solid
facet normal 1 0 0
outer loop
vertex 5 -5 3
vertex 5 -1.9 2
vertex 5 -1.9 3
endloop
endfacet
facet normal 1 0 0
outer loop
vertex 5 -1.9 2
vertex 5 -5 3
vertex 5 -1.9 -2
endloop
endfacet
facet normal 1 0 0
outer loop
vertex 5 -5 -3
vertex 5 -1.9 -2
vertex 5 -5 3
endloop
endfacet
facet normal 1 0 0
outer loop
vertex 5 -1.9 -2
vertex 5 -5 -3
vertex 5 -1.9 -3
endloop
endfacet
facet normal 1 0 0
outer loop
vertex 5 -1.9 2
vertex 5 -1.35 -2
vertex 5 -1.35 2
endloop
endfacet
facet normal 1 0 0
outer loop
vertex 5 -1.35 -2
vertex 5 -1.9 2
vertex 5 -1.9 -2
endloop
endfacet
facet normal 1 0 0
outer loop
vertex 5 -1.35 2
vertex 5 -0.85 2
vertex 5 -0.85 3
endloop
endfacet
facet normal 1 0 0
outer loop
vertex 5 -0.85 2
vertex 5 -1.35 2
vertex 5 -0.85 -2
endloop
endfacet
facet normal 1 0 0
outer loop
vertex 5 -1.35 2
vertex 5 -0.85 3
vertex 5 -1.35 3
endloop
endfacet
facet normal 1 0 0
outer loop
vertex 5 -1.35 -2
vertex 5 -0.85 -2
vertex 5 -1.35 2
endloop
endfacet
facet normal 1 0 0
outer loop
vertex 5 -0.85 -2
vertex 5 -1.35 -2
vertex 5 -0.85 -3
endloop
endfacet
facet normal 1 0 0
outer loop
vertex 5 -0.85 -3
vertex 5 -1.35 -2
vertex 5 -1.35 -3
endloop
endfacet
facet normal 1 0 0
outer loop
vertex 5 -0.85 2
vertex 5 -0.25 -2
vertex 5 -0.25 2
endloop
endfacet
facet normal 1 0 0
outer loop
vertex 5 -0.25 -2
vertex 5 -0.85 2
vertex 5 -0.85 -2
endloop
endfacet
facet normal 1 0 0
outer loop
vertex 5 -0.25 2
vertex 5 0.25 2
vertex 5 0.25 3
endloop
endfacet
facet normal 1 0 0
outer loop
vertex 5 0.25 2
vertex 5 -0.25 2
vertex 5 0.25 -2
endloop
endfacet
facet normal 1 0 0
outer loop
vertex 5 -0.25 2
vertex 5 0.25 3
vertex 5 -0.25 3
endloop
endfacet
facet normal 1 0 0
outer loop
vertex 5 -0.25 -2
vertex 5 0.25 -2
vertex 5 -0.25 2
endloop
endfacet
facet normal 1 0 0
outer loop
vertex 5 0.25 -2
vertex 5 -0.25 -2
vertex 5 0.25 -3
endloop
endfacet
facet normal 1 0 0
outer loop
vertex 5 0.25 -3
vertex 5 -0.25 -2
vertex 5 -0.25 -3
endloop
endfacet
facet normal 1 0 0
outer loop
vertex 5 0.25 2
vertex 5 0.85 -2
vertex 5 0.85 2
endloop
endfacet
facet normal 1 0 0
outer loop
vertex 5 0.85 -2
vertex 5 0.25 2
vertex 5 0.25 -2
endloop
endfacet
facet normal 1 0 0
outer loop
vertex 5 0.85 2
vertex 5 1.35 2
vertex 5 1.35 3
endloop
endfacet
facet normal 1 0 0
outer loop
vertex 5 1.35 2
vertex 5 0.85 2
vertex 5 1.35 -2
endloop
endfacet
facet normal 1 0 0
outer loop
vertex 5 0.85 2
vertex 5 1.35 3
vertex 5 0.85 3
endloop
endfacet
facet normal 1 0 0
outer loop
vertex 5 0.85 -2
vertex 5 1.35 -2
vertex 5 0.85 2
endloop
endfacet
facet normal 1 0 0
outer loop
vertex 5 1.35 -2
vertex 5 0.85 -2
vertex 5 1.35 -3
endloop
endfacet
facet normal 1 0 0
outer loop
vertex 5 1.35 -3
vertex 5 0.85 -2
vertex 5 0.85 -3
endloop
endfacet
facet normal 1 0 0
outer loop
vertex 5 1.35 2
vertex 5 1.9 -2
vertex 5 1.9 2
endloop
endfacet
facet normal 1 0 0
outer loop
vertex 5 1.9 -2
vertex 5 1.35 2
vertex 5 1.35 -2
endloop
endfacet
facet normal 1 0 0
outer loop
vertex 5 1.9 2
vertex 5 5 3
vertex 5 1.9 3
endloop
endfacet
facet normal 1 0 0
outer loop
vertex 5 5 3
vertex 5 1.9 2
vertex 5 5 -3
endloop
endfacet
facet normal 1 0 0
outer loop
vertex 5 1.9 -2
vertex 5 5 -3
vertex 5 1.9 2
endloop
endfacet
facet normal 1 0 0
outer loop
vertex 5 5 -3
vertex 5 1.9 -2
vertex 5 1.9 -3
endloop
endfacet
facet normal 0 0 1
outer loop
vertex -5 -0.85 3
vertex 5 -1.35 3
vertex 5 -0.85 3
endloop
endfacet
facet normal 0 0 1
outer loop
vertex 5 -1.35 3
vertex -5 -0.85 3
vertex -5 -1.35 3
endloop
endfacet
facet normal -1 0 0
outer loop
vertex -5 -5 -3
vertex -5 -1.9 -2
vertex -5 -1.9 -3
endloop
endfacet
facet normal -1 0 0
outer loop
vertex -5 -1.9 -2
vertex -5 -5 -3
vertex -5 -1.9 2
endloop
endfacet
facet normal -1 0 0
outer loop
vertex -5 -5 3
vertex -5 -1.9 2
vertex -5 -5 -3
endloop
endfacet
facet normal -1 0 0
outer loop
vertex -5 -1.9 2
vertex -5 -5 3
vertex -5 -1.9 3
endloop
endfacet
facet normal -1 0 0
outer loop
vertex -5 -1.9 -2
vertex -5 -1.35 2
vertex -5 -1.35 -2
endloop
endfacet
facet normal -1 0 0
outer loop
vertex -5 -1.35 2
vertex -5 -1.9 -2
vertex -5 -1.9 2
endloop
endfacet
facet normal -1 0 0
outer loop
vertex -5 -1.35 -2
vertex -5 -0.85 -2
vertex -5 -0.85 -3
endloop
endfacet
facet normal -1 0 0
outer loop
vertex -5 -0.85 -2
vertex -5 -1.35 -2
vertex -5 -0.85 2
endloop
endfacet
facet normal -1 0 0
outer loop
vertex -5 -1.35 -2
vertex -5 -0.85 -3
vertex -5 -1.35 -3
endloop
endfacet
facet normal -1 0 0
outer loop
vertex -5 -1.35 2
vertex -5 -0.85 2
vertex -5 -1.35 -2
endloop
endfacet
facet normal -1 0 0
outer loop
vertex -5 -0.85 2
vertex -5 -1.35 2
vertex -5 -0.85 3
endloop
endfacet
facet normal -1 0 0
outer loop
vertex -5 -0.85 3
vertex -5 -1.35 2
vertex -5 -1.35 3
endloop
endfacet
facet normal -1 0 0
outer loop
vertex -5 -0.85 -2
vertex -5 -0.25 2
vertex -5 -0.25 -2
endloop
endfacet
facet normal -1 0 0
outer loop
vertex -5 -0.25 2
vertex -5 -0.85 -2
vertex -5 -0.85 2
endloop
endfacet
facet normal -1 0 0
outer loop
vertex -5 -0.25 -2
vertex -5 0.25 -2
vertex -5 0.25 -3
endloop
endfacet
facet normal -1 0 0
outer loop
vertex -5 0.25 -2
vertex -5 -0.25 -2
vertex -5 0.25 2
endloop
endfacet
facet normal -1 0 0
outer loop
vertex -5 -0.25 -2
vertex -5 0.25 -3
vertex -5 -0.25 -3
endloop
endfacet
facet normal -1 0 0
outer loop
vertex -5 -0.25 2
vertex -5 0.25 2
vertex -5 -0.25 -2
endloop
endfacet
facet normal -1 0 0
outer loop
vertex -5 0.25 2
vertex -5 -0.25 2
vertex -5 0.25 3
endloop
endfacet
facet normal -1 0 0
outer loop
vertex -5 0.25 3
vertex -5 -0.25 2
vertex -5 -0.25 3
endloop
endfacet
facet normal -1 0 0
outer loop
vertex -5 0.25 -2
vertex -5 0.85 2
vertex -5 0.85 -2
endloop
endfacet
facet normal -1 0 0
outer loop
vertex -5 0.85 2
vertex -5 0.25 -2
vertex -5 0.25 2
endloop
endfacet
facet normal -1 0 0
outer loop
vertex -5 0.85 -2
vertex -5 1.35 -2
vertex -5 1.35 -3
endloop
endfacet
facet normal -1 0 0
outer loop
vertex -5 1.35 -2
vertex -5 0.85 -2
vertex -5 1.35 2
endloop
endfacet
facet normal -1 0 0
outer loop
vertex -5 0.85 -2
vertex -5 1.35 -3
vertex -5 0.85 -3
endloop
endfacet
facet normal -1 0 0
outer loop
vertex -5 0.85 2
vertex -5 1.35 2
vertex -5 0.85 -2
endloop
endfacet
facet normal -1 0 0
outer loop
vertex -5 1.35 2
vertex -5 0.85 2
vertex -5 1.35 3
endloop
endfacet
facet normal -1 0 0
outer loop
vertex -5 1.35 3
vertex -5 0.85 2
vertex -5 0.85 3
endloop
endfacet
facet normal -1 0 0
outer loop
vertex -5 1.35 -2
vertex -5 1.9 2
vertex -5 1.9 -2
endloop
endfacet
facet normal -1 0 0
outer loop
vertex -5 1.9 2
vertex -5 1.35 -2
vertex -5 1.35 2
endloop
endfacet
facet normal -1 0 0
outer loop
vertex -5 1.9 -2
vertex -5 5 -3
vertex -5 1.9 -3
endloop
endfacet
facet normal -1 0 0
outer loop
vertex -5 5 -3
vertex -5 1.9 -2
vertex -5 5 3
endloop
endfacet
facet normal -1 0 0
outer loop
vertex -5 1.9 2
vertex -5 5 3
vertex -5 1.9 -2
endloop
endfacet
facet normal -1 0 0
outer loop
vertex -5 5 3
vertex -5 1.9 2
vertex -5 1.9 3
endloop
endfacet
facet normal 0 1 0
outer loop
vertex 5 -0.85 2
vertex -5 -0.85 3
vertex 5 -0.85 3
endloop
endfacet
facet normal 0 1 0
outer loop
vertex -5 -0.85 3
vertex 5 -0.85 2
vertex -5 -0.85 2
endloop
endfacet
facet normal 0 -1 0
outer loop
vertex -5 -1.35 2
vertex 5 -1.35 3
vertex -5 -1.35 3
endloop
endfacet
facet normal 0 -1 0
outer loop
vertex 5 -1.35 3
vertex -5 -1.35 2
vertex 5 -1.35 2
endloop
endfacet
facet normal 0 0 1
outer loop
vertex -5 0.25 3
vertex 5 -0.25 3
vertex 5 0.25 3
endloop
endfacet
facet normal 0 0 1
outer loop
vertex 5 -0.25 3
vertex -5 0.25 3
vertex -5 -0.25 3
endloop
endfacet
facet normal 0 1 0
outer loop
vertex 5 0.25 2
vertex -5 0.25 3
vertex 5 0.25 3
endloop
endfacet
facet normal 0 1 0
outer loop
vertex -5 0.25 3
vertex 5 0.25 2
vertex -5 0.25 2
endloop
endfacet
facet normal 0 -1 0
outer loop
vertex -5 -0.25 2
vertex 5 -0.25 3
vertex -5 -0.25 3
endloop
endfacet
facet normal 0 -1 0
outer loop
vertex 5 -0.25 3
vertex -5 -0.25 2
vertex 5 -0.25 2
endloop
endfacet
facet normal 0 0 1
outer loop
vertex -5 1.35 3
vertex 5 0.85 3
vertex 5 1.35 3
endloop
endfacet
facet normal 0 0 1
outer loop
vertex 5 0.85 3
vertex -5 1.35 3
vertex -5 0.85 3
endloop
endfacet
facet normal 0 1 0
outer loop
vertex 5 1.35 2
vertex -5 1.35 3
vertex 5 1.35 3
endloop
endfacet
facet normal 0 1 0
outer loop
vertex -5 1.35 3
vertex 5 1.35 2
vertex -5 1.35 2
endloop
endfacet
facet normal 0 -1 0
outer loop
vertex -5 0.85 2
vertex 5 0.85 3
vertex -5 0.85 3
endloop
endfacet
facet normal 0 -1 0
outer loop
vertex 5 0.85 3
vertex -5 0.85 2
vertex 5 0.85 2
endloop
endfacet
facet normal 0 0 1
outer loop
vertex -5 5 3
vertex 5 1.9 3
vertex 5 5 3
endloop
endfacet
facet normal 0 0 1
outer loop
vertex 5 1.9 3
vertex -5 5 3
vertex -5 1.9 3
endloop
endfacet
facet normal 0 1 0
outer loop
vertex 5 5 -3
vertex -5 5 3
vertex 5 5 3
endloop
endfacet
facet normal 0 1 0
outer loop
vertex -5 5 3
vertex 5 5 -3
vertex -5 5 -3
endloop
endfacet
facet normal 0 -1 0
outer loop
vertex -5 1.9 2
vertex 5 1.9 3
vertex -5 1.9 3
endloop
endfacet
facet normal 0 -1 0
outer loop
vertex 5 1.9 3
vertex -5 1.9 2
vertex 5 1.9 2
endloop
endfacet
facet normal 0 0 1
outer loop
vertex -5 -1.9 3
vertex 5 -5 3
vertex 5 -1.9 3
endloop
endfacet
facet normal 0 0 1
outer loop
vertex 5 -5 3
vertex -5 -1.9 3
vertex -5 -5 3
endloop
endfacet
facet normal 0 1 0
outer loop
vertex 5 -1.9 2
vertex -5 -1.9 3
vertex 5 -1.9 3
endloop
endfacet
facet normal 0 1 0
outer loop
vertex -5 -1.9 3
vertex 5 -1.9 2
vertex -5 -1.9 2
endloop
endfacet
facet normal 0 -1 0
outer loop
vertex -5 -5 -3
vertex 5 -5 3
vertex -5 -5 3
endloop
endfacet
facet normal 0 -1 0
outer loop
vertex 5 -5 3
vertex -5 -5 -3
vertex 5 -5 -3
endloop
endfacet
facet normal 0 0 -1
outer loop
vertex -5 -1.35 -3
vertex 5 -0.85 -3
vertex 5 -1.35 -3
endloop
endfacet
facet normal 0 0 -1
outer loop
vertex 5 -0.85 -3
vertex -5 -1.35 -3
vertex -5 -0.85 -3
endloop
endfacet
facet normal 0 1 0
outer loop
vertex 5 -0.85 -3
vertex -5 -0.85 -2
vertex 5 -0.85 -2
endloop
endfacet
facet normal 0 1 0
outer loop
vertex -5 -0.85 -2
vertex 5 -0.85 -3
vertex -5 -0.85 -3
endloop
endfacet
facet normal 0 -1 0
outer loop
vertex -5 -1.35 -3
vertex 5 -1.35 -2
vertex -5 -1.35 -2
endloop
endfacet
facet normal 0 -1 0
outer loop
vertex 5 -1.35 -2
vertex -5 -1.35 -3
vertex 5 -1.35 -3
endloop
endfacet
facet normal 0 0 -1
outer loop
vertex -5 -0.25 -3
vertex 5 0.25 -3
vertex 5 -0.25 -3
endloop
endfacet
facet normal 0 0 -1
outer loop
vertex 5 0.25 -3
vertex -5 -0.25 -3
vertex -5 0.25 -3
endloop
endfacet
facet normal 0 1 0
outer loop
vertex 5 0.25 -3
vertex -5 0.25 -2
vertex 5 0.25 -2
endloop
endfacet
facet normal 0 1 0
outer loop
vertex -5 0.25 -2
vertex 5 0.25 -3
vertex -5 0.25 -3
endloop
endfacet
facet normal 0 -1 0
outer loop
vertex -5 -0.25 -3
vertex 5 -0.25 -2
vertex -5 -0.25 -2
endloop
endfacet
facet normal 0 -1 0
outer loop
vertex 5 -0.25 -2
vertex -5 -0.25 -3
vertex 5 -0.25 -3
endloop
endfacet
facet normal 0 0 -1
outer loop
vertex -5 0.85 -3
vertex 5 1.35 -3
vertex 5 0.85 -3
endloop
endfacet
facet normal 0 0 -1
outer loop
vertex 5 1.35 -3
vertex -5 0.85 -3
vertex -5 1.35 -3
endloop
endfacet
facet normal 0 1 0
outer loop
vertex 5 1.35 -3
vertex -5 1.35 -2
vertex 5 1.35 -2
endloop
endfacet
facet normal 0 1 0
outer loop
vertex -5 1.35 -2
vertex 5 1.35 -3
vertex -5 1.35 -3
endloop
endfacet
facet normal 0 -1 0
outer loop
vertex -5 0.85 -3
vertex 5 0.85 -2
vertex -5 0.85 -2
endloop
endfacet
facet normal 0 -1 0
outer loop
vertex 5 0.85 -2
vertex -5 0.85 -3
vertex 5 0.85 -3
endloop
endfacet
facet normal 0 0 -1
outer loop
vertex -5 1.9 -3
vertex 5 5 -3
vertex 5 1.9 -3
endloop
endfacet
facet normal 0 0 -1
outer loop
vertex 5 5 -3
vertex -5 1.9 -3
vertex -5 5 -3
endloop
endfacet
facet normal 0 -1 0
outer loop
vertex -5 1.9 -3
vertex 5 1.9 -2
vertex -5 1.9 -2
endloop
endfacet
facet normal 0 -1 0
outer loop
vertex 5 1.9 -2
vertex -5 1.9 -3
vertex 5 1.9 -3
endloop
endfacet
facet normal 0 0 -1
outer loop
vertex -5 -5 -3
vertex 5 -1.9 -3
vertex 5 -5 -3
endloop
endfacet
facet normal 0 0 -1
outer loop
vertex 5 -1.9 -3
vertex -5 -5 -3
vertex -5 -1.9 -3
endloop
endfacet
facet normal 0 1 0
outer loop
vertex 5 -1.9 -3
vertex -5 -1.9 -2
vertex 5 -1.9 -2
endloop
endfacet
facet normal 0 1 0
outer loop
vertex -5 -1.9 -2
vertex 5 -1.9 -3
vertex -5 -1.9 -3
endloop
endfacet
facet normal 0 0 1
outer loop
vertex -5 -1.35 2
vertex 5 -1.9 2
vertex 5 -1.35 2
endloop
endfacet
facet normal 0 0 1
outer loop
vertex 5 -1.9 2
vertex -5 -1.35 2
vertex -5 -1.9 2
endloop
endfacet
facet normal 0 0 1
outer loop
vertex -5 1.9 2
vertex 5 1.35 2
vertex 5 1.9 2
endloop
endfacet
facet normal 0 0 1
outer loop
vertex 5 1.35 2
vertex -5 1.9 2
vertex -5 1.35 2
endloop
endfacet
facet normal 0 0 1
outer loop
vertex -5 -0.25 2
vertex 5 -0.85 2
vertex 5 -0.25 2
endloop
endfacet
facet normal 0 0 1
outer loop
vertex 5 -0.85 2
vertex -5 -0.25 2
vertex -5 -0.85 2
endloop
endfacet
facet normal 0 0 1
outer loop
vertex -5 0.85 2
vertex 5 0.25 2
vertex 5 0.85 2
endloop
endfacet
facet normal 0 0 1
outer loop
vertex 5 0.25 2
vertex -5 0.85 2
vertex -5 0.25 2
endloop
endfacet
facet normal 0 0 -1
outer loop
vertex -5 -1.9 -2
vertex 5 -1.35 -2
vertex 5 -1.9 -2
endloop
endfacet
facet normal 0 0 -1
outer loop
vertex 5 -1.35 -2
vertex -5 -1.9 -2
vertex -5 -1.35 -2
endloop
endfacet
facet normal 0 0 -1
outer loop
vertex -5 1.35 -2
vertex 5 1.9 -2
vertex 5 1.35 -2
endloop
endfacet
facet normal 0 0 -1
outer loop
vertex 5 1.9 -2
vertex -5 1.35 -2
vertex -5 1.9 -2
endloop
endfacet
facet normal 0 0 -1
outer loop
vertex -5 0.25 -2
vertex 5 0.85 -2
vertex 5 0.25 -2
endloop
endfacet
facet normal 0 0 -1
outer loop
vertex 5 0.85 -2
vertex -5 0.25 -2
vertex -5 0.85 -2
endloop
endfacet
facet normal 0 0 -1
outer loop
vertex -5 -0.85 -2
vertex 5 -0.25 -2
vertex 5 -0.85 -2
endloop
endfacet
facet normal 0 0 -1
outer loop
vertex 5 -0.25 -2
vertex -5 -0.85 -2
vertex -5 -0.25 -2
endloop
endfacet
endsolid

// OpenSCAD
baseX = 10;
baseY = 10;
baseZ = 4;

//translate([-10,0,2]) rotate([0,-90,0]) import("led_rgb.stl");

cube([baseX,baseY,baseZ],center=true);

grill();
mirror([0,0,90]) grill();

module grill(){

tz = (baseZ/2);

color("red") translate([0,-1.1,tz]) cube([baseX,.5,2],center=true);
color("green") translate([0,0,tz]) cube([baseX,.5,2],center=true);
color("blue") translate([0,1.1,tz]) cube([baseX,.5,2],center=true);

tWid = 3.1;

color("black") translate([0,(baseY/2)-(tWid/2),tz]) cube([baseX,tWid,2],center=true);
mirror([0,90,0]) color("black") translate([0,(baseY/2)-(tWid/2),tz]) cube([baseX,tWid,2],center=true);
	
}
